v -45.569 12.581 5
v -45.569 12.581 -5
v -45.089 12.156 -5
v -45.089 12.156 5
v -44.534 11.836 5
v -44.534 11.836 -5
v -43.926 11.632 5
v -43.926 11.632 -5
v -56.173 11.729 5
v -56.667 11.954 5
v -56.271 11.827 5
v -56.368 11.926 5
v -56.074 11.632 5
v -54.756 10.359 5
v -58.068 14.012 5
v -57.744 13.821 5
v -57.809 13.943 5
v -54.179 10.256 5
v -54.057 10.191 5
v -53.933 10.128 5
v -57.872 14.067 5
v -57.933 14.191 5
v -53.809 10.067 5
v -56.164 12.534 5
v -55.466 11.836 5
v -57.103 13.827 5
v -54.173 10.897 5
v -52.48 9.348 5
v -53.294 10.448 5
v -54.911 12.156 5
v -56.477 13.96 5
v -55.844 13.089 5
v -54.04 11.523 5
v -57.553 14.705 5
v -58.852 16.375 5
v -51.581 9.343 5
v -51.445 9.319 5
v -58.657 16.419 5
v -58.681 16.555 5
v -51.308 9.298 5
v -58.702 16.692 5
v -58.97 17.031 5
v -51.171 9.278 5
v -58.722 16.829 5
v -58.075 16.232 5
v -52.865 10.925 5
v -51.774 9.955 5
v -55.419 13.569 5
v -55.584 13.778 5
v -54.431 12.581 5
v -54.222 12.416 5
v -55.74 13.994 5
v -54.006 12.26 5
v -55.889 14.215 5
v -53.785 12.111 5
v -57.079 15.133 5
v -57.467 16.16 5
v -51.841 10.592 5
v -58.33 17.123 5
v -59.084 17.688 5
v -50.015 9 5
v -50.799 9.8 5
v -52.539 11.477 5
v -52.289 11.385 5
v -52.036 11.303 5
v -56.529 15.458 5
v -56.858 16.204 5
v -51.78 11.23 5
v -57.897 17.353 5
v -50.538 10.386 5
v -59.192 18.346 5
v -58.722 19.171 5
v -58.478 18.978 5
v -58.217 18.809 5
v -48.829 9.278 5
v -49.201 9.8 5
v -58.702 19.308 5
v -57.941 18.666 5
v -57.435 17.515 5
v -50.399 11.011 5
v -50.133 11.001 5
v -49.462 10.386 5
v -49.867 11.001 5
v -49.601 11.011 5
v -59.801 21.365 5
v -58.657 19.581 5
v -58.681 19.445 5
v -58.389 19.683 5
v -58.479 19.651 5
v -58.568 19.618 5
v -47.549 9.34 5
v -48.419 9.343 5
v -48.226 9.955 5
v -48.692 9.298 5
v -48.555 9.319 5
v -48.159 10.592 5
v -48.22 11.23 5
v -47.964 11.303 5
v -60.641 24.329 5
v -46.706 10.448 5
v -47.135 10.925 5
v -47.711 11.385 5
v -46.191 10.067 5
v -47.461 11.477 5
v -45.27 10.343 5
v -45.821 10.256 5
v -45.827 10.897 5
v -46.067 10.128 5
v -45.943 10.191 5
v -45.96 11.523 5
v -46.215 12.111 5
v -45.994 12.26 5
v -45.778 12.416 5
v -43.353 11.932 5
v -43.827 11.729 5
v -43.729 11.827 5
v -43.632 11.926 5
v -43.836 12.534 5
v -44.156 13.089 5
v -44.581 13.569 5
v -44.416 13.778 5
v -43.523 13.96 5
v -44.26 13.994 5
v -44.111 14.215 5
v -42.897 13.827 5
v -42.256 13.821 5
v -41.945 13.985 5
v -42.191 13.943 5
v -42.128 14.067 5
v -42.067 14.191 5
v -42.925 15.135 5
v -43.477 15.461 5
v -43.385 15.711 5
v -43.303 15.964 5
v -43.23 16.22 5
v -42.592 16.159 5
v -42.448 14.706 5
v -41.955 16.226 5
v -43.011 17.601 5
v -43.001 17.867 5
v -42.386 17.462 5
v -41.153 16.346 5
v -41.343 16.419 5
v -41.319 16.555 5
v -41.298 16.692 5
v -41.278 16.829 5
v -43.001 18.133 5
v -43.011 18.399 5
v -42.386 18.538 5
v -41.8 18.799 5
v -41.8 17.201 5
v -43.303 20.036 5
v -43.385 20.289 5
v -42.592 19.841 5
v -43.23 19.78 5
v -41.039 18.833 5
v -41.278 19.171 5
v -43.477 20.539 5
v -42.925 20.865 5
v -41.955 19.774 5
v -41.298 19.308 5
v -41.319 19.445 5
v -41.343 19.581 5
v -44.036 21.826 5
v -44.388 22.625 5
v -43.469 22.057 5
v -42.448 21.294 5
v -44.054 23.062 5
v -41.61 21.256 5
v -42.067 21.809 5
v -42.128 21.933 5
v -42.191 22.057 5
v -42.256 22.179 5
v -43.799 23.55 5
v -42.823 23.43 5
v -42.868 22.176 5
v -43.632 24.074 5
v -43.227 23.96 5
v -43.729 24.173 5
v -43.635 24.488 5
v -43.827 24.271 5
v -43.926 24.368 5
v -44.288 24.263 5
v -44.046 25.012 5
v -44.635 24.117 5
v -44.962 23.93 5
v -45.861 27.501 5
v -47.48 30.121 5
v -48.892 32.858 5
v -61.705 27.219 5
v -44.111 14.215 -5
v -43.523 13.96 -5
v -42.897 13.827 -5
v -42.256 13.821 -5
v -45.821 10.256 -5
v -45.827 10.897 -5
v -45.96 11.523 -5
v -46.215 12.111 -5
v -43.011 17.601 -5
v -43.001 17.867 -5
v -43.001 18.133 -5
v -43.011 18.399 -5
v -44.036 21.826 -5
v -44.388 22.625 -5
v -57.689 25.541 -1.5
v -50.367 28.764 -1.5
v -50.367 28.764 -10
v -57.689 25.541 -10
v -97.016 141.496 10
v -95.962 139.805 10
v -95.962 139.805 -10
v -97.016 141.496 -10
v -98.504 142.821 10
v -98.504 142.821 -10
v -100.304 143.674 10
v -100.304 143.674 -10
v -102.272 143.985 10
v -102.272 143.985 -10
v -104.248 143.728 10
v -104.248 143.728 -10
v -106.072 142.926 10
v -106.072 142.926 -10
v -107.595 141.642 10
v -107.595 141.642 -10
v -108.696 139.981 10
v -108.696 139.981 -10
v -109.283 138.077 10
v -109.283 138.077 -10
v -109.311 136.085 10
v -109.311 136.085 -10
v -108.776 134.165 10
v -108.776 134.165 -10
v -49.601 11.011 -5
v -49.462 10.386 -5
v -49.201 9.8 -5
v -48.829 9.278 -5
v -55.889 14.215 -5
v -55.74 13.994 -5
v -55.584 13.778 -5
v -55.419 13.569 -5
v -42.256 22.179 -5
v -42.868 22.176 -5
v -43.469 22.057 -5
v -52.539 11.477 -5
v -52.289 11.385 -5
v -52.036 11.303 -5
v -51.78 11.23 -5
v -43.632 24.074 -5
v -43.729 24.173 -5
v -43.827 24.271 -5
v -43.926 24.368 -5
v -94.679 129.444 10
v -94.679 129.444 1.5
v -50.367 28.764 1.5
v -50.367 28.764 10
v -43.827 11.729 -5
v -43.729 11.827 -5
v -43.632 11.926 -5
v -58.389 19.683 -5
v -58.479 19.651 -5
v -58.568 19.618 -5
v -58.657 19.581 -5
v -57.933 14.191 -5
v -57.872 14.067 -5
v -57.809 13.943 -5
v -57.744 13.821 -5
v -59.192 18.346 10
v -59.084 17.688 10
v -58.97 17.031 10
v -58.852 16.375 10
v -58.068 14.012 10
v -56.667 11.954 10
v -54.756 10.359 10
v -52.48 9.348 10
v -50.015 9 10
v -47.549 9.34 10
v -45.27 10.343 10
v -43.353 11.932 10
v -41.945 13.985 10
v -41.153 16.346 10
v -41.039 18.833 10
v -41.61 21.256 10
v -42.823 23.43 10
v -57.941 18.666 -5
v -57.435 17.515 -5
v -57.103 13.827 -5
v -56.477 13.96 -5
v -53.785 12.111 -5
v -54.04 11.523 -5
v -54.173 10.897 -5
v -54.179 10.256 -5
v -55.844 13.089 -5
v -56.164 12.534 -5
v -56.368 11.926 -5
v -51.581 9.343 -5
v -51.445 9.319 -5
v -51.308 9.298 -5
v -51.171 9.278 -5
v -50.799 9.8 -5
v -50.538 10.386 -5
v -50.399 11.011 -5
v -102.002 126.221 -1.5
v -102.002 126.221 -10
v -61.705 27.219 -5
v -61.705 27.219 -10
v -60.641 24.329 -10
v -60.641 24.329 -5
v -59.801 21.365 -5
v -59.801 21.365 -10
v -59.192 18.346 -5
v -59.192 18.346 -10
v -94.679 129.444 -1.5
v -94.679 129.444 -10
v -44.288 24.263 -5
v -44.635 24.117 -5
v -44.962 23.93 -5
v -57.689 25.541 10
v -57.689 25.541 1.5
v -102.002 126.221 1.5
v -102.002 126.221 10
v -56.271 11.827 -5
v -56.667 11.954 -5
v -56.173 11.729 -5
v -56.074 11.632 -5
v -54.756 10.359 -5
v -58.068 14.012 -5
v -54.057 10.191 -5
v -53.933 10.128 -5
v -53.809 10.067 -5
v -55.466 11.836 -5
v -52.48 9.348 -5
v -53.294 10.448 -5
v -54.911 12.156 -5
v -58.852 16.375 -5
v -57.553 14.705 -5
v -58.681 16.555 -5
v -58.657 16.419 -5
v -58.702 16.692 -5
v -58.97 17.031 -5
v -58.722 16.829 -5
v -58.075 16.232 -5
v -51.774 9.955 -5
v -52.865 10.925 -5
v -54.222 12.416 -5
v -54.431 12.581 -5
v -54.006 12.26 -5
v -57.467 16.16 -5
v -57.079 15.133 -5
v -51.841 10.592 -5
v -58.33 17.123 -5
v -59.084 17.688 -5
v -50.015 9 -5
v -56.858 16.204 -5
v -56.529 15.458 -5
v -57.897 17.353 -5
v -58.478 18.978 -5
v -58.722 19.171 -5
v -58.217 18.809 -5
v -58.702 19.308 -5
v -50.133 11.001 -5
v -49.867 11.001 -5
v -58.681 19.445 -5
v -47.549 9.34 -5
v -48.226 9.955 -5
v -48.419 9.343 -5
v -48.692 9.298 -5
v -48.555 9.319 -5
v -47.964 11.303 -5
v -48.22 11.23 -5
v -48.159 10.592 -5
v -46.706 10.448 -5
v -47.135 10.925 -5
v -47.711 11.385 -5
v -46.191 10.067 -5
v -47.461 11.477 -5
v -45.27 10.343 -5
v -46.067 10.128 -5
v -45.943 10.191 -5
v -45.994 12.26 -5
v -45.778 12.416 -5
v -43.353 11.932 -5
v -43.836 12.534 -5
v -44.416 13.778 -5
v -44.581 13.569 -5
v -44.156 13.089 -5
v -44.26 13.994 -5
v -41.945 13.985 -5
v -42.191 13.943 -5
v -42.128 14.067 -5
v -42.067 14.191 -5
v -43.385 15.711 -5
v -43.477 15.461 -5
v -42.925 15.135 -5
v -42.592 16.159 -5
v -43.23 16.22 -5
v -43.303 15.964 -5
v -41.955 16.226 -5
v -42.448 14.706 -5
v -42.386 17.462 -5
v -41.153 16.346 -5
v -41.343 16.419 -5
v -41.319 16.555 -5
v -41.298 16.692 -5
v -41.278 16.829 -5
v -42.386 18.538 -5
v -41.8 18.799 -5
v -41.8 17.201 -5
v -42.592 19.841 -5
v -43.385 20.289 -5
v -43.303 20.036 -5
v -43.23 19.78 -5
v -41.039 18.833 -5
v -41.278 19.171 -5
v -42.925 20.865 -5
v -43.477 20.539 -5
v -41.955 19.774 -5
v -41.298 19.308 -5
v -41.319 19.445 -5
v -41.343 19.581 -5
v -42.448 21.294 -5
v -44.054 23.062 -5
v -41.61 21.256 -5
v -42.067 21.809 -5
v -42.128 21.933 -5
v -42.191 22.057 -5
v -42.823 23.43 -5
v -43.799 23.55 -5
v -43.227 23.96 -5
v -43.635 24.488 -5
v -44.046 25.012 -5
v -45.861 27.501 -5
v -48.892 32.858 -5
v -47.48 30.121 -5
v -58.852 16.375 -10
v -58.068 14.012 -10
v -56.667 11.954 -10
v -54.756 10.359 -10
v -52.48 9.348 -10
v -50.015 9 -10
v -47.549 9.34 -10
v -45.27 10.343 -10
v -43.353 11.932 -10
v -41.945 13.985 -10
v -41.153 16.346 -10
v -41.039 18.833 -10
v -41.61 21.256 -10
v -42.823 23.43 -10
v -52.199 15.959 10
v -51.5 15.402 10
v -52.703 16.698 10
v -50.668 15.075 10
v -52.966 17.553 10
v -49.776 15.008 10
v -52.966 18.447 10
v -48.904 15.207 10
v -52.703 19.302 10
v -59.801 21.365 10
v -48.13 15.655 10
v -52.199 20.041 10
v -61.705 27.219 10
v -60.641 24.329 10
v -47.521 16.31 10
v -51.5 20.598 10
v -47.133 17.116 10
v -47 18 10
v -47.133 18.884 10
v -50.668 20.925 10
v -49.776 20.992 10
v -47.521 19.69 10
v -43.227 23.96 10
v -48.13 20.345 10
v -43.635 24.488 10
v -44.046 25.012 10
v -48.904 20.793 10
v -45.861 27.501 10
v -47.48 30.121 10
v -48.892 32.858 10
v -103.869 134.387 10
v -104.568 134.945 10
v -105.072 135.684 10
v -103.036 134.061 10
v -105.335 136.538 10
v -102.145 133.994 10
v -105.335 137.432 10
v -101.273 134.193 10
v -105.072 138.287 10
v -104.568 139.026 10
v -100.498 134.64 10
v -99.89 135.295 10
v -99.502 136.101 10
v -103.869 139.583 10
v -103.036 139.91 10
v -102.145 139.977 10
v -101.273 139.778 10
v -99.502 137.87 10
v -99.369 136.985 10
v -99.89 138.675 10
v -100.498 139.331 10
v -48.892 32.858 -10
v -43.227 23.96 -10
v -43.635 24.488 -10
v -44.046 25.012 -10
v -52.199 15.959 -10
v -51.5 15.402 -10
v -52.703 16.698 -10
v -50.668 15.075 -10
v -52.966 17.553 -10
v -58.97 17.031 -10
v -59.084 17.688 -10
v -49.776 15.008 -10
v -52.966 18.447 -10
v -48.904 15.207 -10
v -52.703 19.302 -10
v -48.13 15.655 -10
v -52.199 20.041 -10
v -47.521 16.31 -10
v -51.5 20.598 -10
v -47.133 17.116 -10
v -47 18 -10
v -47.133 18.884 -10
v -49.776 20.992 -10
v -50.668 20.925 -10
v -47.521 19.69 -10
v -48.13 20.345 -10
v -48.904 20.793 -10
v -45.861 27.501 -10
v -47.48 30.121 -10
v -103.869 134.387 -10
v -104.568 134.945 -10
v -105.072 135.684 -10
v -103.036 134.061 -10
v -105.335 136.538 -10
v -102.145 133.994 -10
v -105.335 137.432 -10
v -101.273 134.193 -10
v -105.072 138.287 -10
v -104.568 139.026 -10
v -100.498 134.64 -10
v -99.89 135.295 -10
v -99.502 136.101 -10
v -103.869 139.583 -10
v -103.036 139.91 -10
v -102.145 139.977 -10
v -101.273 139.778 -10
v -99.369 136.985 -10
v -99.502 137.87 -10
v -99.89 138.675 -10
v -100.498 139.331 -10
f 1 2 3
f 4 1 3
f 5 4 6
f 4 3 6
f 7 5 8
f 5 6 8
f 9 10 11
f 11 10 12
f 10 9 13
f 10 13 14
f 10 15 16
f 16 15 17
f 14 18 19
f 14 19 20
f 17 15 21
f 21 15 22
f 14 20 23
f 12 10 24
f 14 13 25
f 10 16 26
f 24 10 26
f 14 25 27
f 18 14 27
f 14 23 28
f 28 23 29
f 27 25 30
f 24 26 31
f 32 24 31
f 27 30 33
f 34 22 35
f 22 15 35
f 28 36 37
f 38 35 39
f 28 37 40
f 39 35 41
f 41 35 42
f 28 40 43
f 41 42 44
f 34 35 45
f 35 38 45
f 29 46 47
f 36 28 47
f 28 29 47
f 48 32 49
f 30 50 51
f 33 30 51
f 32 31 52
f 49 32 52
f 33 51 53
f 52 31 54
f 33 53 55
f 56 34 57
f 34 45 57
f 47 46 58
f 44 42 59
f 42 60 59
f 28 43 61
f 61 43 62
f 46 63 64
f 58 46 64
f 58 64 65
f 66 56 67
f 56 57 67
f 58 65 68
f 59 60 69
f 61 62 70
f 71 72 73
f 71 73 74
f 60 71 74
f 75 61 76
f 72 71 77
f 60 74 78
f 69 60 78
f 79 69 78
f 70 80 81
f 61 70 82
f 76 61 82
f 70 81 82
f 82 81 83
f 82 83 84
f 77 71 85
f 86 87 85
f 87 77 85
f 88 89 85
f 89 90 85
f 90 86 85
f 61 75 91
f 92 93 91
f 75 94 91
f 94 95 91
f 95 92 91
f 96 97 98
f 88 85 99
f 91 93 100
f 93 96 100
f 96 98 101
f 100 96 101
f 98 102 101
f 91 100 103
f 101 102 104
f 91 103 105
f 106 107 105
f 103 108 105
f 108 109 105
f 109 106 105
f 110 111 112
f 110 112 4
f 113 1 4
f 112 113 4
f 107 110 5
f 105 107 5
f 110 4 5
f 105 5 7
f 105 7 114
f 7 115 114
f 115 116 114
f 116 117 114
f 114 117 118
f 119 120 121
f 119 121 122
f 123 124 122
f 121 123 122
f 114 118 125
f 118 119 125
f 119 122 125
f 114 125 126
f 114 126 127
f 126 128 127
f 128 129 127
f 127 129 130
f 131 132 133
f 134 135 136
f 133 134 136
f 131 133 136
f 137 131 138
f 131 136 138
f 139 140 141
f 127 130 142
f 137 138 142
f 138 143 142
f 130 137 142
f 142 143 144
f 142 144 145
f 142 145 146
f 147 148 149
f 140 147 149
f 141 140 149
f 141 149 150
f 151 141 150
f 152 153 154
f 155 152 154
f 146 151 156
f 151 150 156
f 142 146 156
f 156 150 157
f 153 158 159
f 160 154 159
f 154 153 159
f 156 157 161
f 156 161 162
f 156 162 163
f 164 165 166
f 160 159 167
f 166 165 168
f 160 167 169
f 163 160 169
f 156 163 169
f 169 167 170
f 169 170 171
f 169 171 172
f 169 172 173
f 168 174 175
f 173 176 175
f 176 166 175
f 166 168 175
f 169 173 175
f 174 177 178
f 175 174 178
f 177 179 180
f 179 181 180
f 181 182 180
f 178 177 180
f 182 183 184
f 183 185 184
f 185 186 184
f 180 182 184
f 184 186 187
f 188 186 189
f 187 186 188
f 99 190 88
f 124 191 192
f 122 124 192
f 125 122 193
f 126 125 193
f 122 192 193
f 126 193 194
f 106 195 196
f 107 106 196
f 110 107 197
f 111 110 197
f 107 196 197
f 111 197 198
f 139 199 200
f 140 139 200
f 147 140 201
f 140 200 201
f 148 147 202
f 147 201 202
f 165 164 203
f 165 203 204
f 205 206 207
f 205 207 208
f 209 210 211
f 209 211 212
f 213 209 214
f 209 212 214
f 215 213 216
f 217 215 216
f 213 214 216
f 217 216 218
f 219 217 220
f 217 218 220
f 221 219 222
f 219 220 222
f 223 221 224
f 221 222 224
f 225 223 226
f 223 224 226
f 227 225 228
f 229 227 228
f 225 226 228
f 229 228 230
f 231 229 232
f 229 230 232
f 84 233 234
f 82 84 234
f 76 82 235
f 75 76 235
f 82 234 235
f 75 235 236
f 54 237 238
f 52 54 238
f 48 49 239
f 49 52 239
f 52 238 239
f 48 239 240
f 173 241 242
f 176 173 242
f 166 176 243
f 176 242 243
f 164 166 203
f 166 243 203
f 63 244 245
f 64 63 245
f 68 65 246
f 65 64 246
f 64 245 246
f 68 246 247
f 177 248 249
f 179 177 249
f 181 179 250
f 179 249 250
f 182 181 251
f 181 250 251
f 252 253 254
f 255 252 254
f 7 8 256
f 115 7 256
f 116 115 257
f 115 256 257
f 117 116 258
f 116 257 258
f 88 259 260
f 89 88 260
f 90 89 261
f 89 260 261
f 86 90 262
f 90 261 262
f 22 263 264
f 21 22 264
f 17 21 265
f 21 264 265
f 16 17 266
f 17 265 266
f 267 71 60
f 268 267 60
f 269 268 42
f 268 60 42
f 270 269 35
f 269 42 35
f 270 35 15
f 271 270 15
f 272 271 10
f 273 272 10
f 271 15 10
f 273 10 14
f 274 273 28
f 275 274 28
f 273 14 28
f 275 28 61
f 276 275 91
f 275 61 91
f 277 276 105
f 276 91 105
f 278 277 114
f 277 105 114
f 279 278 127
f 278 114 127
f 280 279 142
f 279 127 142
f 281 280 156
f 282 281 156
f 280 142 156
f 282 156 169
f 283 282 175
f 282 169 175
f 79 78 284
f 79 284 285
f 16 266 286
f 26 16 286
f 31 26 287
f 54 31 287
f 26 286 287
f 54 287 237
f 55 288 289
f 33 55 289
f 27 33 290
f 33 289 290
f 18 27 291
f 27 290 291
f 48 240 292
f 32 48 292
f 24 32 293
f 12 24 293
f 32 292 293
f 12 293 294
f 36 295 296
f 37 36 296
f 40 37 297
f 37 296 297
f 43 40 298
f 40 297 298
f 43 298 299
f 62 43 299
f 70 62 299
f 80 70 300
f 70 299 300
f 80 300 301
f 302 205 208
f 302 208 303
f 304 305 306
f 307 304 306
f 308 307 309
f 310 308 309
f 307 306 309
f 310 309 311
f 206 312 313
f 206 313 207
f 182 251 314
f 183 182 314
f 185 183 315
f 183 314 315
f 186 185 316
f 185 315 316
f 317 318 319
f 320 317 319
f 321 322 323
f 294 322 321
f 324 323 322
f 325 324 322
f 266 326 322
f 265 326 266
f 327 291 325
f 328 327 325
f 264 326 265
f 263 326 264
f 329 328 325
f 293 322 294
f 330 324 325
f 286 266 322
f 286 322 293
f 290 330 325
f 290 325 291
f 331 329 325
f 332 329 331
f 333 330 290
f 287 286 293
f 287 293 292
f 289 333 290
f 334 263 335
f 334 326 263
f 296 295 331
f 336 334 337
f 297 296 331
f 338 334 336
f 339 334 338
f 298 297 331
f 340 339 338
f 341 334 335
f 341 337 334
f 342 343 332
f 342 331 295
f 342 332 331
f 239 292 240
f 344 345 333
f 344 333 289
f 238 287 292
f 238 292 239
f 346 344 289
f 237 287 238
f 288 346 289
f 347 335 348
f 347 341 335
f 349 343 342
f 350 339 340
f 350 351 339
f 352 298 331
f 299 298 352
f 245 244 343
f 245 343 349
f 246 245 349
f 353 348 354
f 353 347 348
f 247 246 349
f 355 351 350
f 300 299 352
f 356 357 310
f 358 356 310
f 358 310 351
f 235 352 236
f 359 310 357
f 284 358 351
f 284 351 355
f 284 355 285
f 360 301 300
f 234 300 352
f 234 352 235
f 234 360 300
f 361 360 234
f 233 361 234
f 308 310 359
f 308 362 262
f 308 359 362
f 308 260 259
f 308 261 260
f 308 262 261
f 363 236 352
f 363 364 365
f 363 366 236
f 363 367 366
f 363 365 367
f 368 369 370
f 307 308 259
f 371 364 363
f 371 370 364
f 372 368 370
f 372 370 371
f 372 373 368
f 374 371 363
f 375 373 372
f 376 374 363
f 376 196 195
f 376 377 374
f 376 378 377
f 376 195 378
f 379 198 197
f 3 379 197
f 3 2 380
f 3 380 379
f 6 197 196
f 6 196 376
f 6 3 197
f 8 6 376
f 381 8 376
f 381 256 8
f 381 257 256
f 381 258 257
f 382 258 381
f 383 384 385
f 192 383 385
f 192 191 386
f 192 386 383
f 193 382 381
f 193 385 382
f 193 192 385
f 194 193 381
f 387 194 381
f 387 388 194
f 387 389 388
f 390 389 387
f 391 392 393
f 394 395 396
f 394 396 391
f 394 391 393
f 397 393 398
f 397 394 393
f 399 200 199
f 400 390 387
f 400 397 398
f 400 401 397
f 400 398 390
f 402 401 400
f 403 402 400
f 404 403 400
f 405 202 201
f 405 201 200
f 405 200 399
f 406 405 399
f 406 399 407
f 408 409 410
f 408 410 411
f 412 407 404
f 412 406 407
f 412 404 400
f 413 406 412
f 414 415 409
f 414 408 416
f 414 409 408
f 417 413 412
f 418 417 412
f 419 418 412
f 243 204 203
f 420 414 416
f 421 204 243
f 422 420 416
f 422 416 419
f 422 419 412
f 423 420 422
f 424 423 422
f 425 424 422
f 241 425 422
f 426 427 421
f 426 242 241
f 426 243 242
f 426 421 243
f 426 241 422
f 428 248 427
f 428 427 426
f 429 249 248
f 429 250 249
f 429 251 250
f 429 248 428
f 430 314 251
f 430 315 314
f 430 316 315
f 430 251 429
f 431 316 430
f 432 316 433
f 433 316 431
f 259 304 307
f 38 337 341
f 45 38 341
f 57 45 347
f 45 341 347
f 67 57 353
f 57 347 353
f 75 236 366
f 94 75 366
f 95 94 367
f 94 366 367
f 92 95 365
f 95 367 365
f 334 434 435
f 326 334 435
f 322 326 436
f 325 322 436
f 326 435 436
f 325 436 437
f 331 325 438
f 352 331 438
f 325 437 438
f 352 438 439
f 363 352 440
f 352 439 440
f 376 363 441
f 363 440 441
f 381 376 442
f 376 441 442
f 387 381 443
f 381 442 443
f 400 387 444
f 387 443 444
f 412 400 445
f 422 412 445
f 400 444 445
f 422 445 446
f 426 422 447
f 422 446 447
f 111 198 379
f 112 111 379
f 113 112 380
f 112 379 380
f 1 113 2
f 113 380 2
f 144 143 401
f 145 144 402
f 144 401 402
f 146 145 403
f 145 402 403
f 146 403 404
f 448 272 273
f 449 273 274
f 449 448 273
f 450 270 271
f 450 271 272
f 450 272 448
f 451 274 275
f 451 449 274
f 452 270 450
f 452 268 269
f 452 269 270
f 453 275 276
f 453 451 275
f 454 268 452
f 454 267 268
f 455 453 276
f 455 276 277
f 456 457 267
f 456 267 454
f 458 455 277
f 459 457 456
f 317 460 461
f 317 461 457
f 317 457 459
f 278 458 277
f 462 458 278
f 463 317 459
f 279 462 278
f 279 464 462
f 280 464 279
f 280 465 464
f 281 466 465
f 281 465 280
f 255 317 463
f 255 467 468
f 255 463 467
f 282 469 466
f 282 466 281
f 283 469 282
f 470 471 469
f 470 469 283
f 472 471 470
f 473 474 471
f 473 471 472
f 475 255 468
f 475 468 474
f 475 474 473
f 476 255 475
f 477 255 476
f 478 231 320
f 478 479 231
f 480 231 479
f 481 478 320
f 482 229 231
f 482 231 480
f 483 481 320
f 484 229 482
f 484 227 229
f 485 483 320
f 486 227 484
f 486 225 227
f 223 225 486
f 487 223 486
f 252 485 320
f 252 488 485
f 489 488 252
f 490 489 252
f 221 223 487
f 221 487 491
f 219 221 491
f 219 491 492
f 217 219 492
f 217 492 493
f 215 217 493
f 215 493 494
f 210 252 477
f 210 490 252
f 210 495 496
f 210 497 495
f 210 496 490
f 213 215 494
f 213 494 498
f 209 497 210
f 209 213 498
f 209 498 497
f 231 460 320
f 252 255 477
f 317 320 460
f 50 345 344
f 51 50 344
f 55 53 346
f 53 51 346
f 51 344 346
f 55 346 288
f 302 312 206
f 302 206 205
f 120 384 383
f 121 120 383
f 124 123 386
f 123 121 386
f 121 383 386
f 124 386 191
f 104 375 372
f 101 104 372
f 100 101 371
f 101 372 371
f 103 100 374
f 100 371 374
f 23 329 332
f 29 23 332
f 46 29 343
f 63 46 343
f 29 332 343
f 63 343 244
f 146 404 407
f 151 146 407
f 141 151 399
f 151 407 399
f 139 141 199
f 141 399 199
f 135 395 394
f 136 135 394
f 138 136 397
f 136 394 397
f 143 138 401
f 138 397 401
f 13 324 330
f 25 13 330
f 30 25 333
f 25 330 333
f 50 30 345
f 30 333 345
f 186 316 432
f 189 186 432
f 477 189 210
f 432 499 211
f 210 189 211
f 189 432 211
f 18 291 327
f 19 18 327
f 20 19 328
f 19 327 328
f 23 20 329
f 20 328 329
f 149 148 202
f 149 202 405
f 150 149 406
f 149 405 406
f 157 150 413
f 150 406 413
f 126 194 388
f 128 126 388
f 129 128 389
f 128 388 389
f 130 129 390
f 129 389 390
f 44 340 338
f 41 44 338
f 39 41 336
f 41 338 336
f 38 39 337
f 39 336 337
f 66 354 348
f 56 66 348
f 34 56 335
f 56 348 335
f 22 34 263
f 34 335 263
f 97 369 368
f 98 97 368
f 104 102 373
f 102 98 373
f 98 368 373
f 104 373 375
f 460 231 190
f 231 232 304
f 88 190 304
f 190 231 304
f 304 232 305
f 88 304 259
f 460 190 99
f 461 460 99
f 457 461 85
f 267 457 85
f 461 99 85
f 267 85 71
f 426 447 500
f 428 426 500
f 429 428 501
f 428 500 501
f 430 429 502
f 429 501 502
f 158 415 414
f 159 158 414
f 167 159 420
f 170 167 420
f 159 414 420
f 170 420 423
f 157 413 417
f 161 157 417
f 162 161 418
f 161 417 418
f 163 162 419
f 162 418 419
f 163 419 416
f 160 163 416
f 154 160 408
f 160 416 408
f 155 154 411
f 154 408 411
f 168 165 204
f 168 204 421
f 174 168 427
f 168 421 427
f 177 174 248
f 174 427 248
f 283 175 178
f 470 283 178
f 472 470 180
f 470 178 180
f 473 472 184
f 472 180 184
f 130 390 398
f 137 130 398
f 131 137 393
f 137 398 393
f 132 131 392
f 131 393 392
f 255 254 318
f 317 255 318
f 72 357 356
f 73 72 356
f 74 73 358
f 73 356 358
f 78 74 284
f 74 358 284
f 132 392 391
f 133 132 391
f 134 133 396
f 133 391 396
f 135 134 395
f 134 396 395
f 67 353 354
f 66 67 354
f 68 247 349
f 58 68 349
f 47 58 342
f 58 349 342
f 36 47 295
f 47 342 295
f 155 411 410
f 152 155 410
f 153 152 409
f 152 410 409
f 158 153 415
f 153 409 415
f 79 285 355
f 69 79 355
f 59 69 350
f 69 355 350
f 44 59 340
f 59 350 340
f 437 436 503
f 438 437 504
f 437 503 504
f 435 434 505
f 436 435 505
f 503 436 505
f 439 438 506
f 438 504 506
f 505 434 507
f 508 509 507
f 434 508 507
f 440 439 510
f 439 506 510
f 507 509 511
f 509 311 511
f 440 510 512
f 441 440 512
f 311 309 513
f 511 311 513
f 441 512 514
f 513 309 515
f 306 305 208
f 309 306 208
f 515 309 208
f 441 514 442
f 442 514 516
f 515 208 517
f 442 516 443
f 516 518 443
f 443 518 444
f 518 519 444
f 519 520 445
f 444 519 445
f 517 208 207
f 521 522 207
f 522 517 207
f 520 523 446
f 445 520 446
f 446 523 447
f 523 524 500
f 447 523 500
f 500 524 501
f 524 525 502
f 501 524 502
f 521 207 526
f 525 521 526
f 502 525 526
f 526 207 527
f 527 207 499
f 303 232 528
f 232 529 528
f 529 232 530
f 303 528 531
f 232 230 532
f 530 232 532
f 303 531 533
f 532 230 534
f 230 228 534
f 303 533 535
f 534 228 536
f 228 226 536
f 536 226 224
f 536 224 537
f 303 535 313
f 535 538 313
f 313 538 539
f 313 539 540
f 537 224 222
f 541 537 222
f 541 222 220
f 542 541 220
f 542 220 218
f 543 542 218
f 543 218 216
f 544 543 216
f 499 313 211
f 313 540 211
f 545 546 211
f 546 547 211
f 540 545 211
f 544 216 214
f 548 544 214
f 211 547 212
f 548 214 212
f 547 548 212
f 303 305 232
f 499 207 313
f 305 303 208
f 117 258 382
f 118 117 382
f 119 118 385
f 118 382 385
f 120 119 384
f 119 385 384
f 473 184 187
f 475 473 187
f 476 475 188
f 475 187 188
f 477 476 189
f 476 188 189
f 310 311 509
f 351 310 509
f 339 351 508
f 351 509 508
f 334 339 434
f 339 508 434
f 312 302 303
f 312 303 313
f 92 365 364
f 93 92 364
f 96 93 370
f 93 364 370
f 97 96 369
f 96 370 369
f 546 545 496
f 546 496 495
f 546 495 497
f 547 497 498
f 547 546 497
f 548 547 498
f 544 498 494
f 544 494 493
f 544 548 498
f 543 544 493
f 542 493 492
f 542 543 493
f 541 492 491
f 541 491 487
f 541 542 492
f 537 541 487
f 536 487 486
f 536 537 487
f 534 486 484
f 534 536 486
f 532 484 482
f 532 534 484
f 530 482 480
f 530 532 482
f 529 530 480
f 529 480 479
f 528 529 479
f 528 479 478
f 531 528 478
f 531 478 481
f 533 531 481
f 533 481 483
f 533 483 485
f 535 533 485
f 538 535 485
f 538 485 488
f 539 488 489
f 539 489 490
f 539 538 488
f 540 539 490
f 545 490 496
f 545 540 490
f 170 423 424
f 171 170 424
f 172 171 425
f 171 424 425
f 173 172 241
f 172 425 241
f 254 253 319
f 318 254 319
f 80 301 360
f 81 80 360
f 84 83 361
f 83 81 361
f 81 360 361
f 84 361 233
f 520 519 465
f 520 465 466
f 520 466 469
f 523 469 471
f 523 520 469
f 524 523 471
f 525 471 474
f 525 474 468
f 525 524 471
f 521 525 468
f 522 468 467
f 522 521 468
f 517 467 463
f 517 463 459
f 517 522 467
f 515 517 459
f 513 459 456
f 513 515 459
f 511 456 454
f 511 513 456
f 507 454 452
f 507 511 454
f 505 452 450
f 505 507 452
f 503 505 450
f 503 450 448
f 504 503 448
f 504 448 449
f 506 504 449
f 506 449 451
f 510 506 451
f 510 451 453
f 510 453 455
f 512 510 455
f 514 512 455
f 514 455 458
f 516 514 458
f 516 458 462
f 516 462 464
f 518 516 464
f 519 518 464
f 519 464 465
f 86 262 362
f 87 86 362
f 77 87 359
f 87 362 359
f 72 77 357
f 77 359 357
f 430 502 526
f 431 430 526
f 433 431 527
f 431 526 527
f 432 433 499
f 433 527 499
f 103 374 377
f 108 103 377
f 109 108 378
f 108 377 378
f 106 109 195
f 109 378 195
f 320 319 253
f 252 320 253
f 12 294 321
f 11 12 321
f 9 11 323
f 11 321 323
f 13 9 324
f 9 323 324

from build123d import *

# Parameters (mm, degrees)
BOSS_EXTRUDE1_DEPTH                       = 10
BOSS_EXTRUDE1_DEPTH_BACK                  = 10
SKETCH1_R                                 = 3
CUT_EXTRUDE1_START                        = -1.5
CUT_EXTRUDE1_DEPTH                        = 8.5
CUT_EXTRUDE2_START                        = 1.5
CUT_EXTRUDE2_DEPTH                        = 8.5
ISO_START                                 = -65.353403805
ISO_SPUR_GEAR_0_8M_20T_20PA_10FW_2_R      = 3
ISO_SPUR_GEAR_0_8M_20T_20PA_10FW_S2_DEPTH = 10
BODY_MOVE_COPY5_ANGLE                     = 90
BOSS_EXTRUDE3_START                       = 5
BOSS_EXTRUDE3_DEPTH                       = 5
BOSS_EXTRUDE4_START                       = -10
BOSS_EXTRUDE4_DEPTH                       = 5


with BuildPart() as part:
    # Sketch1 → Boss-Extrude1 (new, two sides: drawn at the far end of the back side and taken through both)
    with BuildSketch(Plane.XY.offset(-BOSS_EXTRUDE1_DEPTH_BACK)):
        with BuildLine():
            Line((-43.593099474, 20.819862701), (-95.961978206, 139.805158181))
            ThreePointArc((-95.961978206, 139.805158181), (-105.188741432, 143.392196006), (-108.775779257, 134.165432779))
            Line((-108.775779257, 134.165432779), (-56.406900526, 15.180137299))
            ThreePointArc((-56.406900526, 15.180137299), (-47.180137299, 11.593099474), (-43.593099474, 20.819862701))
        make_face()
        with Locations((-102.368878731, 136.98529548)):
            Circle(SKETCH1_R, mode=Mode.SUBTRACT)
        with Locations((-50, 18)):
            Circle(SKETCH1_R, mode=Mode.SUBTRACT)
    extrude(amount=BOSS_EXTRUDE1_DEPTH + BOSS_EXTRUDE1_DEPTH_BACK)

    # Sketch3 → Cut-Extrude1 (cut)
    with BuildSketch(Plane.XY.offset(CUT_EXTRUDE1_START)):
        Polygon((-102.001589459, 126.221230328), (-94.67941743, 129.443930558), (-50.367289272, 28.764065152), (-57.689461302, 25.541364922), align=None)
    extrude(amount=-CUT_EXTRUDE1_DEPTH, mode=Mode.SUBTRACT)

    # Sketch3<2> → Cut-Extrude2 (cut)
    with BuildSketch(Plane.XY.offset(CUT_EXTRUDE2_START)):
        Polygon((-102.001589459, 126.221230328), (-94.67941743, 129.443930558), (-50.367289272, 28.764065152), (-57.689461302, 25.541364922), align=None)
    extrude(amount=CUT_EXTRUDE2_DEPTH, mode=Mode.SUBTRACT)


with BuildPart() as body_2:
    # ISO - Spur gear 0.8M 20T 20PA 10FW ---S2: read off the stored shape, not the designer's step
    # ISO - Spur gear 0.8M 20T 20PA 10FW - 2 → ISO - Spur gear 0.8M 20T 20PA 10FW ---S2 (new body)
    with BuildSketch(Plane.YZ.offset(ISO_START)):
        with BuildLine():
            ThreePointArc((13.061118754, 13.065363156), (12.856461697, 13.100257159), (12.65103843, 13.130313498))
            ThreePointArc((12.65103843, 13.130313498), (12.133552117, 12.321807494), (11.879141065, 11.396200093))
            ThreePointArc((11.879141065, 11.396200093), (11.479838405, 11.407599762), (11.080535745, 11.396200093))
            ThreePointArc((11.080535745, 11.396200093), (10.826124693, 12.321807494), (10.30863838, 13.130313498))
            ThreePointArc((10.30863838, 13.130313498), (10.103215113, 13.100257159), (9.898558056, 13.065363156))
            ThreePointArc((9.898558056, 13.065363156), (9.656241422, 12.136516187), (9.70031055, 11.177593898))
            ThreePointArc((9.70031055, 11.177593898), (9.317028462, 11.065044319), (8.940791756, 10.930811282))
            ThreePointArc((8.940791756, 10.930811282), (8.41280405, 11.732498893), (7.670803225, 12.341521733))
            ThreePointArc((7.670803225, 12.341521733), (7.484722007, 12.249457175), (7.30086442, 12.153028497))
            ThreePointArc((7.30086442, 12.153028497), (7.357437105, 11.194762576), (7.695672619, 10.296391394))
            ThreePointArc((7.695672619, 10.296391394), (7.365929424, 10.070909706), (7.049587344, 9.826982965))
            ThreePointArc((7.049587344, 9.826982965), (6.299706099, 10.426276017), (5.405822972, 10.776200293))
            ThreePointArc((5.405822972, 10.776200293), (5.257298731, 10.631139436), (5.112237874, 10.482615195))
            ThreePointArc((5.112237874, 10.482615195), (5.46216215, 9.588732068), (6.061455202, 8.838850823))
            ThreePointArc((6.061455202, 8.838850823), (5.817528461, 8.522508743), (5.592046773, 8.192765548))
            ThreePointArc((5.592046773, 8.192765548), (4.693675591, 8.531001062), (3.73540967, 8.587573747))
            ThreePointArc((3.73540967, 8.587573747), (3.638980992, 8.40371616), (3.546916434, 8.217634942))
            ThreePointArc((3.546916434, 8.217634942), (4.155939274, 7.475634117), (4.957626885, 6.947646411))
            ThreePointArc((4.957626885, 6.947646411), (4.823393847, 6.571409706), (4.710844269, 6.188127617))
            ThreePointArc((4.710844269, 6.188127617), (3.75192198, 6.232196745), (2.823075011, 5.989880111))
            ThreePointArc((2.823075011, 5.989880111), (2.788181008, 5.785223054), (2.758124669, 5.579799787))
            ThreePointArc((2.758124669, 5.579799787), (3.566630673, 5.062313474), (4.492238074, 4.807902422))
            ThreePointArc((4.492238074, 4.807902422), (4.480838405, 4.408599762), (4.492238074, 4.009297102))
            ThreePointArc((4.492238074, 4.009297102), (3.566630673, 3.75488605), (2.758124669, 3.237399737))
            ThreePointArc((2.758124669, 3.237399737), (2.788181008, 3.03197647), (2.823075011, 2.827319413))
            ThreePointArc((2.823075011, 2.827319413), (3.75192198, 2.585002779), (4.710844269, 2.629071907))
            ThreePointArc((4.710844269, 2.629071907), (4.823393847, 2.245789818), (4.957626885, 1.869553113))
            ThreePointArc((4.957626885, 1.869553113), (4.155939274, 1.341565407), (3.546916434, 0.599564582))
            ThreePointArc((3.546916434, 0.599564582), (3.638980992, 0.413483364), (3.73540967, 0.229625777))
            ThreePointArc((3.73540967, 0.229625777), (4.693675591, 0.286198462), (5.592046773, 0.624433976))
            ThreePointArc((5.592046773, 0.624433976), (5.817528461, 0.294690781), (6.061455202, -0.021651299))
            ThreePointArc((6.061455202, -0.021651299), (5.46216215, -0.771532544), (5.112237874, -1.665415671))
            ThreePointArc((5.112237874, -1.665415671), (5.257298731, -1.813939912), (5.405822972, -1.959000769))
            ThreePointArc((5.405822972, -1.959000769), (6.299706099, -1.609076494), (7.049587344, -1.009783441))
            ThreePointArc((7.049587344, -1.009783441), (7.365929424, -1.253710182), (7.695672619, -1.479191871))
            ThreePointArc((7.695672619, -1.479191871), (7.357437105, -2.377563053), (7.30086442, -3.335828973))
            ThreePointArc((7.30086442, -3.335828973), (7.484722007, -3.432257651), (7.670803225, -3.524322209))
            ThreePointArc((7.670803225, -3.524322209), (8.41280405, -2.915299369), (8.940791756, -2.113611758))
            ThreePointArc((8.940791756, -2.113611758), (9.317028461, -2.247844796), (9.70031055, -2.360394374))
            ThreePointArc((9.70031055, -2.360394374), (9.656241422, -3.319316663), (9.898558056, -4.248163632))
            ThreePointArc((9.898558056, -4.248163632), (10.103215113, -4.283057635), (10.30863838, -4.313113975))
            ThreePointArc((10.30863838, -4.313113975), (10.826124693, -3.50460797), (11.080535745, -2.579000569))
            ThreePointArc((11.080535745, -2.579000569), (11.479838405, -2.590400238), (11.879141065, -2.579000569))
            ThreePointArc((11.879141065, -2.579000569), (12.133552117, -3.50460797), (12.65103843, -4.313113975))
            ThreePointArc((12.65103843, -4.313113975), (12.856461697, -4.283057635), (13.061118754, -4.248163632))
            ThreePointArc((13.061118754, -4.248163632), (13.303435388, -3.319316663), (13.25936626, -2.360394374))
            ThreePointArc((13.25936626, -2.360394374), (13.642648349, -2.247844796), (14.018885054, -2.113611758))
            ThreePointArc((14.018885054, -2.113611758), (14.54687276, -2.915299369), (15.288873585, -3.524322209))
            ThreePointArc((15.288873585, -3.524322209), (15.474954803, -3.432257651), (15.65881239, -3.335828973))
            ThreePointArc((15.65881239, -3.335828973), (15.602239705, -2.377563053), (15.264004191, -1.479191871))
            ThreePointArc((15.264004191, -1.479191871), (15.593747386, -1.253710182), (15.910089466, -1.009783441))
            ThreePointArc((15.910089466, -1.009783441), (16.659970711, -1.609076494), (17.553853838, -1.959000769))
            ThreePointArc((17.553853838, -1.959000769), (17.702378079, -1.813939912), (17.847438936, -1.665415671))
            ThreePointArc((17.847438936, -1.665415671), (17.49751466, -0.771532544), (16.898221608, -0.021651299))
            ThreePointArc((16.898221608, -0.021651299), (17.142148349, 0.294690781), (17.367630037, 0.624433976))
            ThreePointArc((17.367630037, 0.624433976), (18.266001219, 0.286198462), (19.22426714, 0.229625777))
            ThreePointArc((19.22426714, 0.229625777), (19.320695818, 0.413483364), (19.412760376, 0.599564582))
            ThreePointArc((19.412760376, 0.599564582), (18.803737536, 1.341565407), (18.002049925, 1.869553113))
            ThreePointArc((18.002049925, 1.869553113), (18.136282963, 2.245789818), (18.248832541, 2.629071907))
            ThreePointArc((18.248832541, 2.629071907), (19.20775483, 2.585002779), (20.136601799, 2.827319413))
            ThreePointArc((20.136601799, 2.827319413), (20.171495802, 3.03197647), (20.201552142, 3.237399737))
            ThreePointArc((20.201552142, 3.237399737), (19.393046137, 3.75488605), (18.467438736, 4.009297102))
            ThreePointArc((18.467438736, 4.009297102), (18.478838405, 4.408599762), (18.467438736, 4.807902422))
            ThreePointArc((18.467438736, 4.807902422), (19.393046137, 5.062313474), (20.201552142, 5.579799787))
            ThreePointArc((20.201552142, 5.579799787), (20.171495802, 5.785223054), (20.136601799, 5.989880111))
            ThreePointArc((20.136601799, 5.989880111), (19.20775483, 6.232196745), (18.248832541, 6.188127617))
            ThreePointArc((18.248832541, 6.188127617), (18.136282963, 6.571409706), (18.002049925, 6.947646411))
            ThreePointArc((18.002049925, 6.947646411), (18.803737536, 7.475634117), (19.412760376, 8.217634942))
            ThreePointArc((19.412760376, 8.217634942), (19.320695818, 8.40371616), (19.22426714, 8.587573747))
            ThreePointArc((19.22426714, 8.587573747), (18.266001219, 8.531001062), (17.367630037, 8.192765548))
            ThreePointArc((17.367630037, 8.192765548), (17.142148349, 8.522508743), (16.898221608, 8.838850823))
            ThreePointArc((16.898221608, 8.838850823), (17.49751466, 9.588732068), (17.847438936, 10.482615195))
            ThreePointArc((17.847438936, 10.482615195), (17.702378079, 10.631139436), (17.553853838, 10.776200293))
            ThreePointArc((17.553853838, 10.776200293), (16.659970711, 10.426276017), (15.910089466, 9.826982965))
            ThreePointArc((15.910089466, 9.826982965), (15.593747386, 10.070909706), (15.264004191, 10.296391394))
            ThreePointArc((15.264004191, 10.296391394), (15.602239705, 11.194762576), (15.65881239, 12.153028497))
            ThreePointArc((15.65881239, 12.153028497), (15.474954803, 12.249457175), (15.288873585, 12.341521733))
            ThreePointArc((15.288873585, 12.341521733), (14.54687276, 11.732498893), (14.018885054, 10.930811282))
            ThreePointArc((14.018885054, 10.930811282), (13.642648348, 11.065044319), (13.25936626, 11.177593898))
            ThreePointArc((13.25936626, 11.177593898), (13.303435388, 12.136516187), (13.061118754, 13.065363156))
        make_face()
        with Locations((11.479838405, 4.408599762)):
            Circle(ISO_SPUR_GEAR_0_8M_20T_20PA_10FW_2_R, mode=Mode.SUBTRACT)
    extrude(amount=ISO_SPUR_GEAR_0_8M_20T_20PA_10FW_S2_DEPTH)


with BuildPart() as body_2_1:
    # Body-Move/Copy5: read off the stored shape, not the designer's step
    # Body-Move/Copy5: moved
    add(body_2.part.moved(Location((60.3534038, 6.5201616, 45.5914002))).rotate(Axis((0, 0, 0), (0, -1, 0)), BODY_MOVE_COPY5_ANGLE))


with BuildPart() as part_1:
    add(part.part)

    # Combine1: union body 2
    add(body_2_1.part)

    # Sketch12 → Boss-Extrude3 (add)
    with BuildSketch(Plane.XY.offset(BOSS_EXTRUDE3_START)):
        with BuildLine():
            Line((-48.891620836, 32.858427304), (-43.593099474, 20.819862701))
            ThreePointArc((-43.593099474, 20.819862701), (-47.180137299, 11.593099474), (-56.406900526, 15.180137299))
            Line((-56.406900526, 15.180137299), (-61.705421887, 27.218701903))
            ThreePointArc((-61.705421887, 27.218701903), (-60.19239704, 22.855047235), (-59.192458109, 18.34607303))
            ThreePointArc((-59.192458109, 18.34607303), (-59.027479347, 17.359761867), (-58.852127503, 16.375241967))
            ThreePointArc((-58.852127503, 16.375241967), (-46.374462242, 9.762556467), (-42.82276978, 23.430227101))
            ThreePointArc((-42.82276978, 23.430227101), (-43.430325673, 24.224521466), (-44.0462089, 25.012376499))
            ThreePointArc((-44.0462089, 25.012376499), (-46.695775375, 28.795301788), (-48.891620836, 32.858427304))
        make_face()
    extrude(amount=BOSS_EXTRUDE3_DEPTH)

    # Sketch12<9> → Boss-Extrude4 (add)
    with BuildSketch(Plane.XY.offset(BOSS_EXTRUDE4_START)):
        with BuildLine():
            Line((-48.891620836, 32.858427304), (-43.593099474, 20.819862701))
            ThreePointArc((-43.593099474, 20.819862701), (-47.180137299, 11.593099474), (-56.406900526, 15.180137299))
            Line((-56.406900526, 15.180137299), (-61.705421887, 27.218701903))
            ThreePointArc((-61.705421887, 27.218701903), (-60.19239704, 22.855047235), (-59.192458109, 18.34607303))
            ThreePointArc((-59.192458109, 18.34607303), (-59.027479347, 17.359761867), (-58.852127503, 16.375241967))
            ThreePointArc((-58.852127503, 16.375241967), (-46.374462242, 9.762556467), (-42.82276978, 23.430227101))
            ThreePointArc((-42.82276978, 23.430227101), (-43.430325673, 24.224521466), (-44.0462089, 25.012376499))
            ThreePointArc((-44.0462089, 25.012376499), (-46.695775375, 28.795301788), (-48.891620836, 32.858427304))
        make_face()
    extrude(amount=BOSS_EXTRUDE4_DEPTH)


solid = part_1.part
